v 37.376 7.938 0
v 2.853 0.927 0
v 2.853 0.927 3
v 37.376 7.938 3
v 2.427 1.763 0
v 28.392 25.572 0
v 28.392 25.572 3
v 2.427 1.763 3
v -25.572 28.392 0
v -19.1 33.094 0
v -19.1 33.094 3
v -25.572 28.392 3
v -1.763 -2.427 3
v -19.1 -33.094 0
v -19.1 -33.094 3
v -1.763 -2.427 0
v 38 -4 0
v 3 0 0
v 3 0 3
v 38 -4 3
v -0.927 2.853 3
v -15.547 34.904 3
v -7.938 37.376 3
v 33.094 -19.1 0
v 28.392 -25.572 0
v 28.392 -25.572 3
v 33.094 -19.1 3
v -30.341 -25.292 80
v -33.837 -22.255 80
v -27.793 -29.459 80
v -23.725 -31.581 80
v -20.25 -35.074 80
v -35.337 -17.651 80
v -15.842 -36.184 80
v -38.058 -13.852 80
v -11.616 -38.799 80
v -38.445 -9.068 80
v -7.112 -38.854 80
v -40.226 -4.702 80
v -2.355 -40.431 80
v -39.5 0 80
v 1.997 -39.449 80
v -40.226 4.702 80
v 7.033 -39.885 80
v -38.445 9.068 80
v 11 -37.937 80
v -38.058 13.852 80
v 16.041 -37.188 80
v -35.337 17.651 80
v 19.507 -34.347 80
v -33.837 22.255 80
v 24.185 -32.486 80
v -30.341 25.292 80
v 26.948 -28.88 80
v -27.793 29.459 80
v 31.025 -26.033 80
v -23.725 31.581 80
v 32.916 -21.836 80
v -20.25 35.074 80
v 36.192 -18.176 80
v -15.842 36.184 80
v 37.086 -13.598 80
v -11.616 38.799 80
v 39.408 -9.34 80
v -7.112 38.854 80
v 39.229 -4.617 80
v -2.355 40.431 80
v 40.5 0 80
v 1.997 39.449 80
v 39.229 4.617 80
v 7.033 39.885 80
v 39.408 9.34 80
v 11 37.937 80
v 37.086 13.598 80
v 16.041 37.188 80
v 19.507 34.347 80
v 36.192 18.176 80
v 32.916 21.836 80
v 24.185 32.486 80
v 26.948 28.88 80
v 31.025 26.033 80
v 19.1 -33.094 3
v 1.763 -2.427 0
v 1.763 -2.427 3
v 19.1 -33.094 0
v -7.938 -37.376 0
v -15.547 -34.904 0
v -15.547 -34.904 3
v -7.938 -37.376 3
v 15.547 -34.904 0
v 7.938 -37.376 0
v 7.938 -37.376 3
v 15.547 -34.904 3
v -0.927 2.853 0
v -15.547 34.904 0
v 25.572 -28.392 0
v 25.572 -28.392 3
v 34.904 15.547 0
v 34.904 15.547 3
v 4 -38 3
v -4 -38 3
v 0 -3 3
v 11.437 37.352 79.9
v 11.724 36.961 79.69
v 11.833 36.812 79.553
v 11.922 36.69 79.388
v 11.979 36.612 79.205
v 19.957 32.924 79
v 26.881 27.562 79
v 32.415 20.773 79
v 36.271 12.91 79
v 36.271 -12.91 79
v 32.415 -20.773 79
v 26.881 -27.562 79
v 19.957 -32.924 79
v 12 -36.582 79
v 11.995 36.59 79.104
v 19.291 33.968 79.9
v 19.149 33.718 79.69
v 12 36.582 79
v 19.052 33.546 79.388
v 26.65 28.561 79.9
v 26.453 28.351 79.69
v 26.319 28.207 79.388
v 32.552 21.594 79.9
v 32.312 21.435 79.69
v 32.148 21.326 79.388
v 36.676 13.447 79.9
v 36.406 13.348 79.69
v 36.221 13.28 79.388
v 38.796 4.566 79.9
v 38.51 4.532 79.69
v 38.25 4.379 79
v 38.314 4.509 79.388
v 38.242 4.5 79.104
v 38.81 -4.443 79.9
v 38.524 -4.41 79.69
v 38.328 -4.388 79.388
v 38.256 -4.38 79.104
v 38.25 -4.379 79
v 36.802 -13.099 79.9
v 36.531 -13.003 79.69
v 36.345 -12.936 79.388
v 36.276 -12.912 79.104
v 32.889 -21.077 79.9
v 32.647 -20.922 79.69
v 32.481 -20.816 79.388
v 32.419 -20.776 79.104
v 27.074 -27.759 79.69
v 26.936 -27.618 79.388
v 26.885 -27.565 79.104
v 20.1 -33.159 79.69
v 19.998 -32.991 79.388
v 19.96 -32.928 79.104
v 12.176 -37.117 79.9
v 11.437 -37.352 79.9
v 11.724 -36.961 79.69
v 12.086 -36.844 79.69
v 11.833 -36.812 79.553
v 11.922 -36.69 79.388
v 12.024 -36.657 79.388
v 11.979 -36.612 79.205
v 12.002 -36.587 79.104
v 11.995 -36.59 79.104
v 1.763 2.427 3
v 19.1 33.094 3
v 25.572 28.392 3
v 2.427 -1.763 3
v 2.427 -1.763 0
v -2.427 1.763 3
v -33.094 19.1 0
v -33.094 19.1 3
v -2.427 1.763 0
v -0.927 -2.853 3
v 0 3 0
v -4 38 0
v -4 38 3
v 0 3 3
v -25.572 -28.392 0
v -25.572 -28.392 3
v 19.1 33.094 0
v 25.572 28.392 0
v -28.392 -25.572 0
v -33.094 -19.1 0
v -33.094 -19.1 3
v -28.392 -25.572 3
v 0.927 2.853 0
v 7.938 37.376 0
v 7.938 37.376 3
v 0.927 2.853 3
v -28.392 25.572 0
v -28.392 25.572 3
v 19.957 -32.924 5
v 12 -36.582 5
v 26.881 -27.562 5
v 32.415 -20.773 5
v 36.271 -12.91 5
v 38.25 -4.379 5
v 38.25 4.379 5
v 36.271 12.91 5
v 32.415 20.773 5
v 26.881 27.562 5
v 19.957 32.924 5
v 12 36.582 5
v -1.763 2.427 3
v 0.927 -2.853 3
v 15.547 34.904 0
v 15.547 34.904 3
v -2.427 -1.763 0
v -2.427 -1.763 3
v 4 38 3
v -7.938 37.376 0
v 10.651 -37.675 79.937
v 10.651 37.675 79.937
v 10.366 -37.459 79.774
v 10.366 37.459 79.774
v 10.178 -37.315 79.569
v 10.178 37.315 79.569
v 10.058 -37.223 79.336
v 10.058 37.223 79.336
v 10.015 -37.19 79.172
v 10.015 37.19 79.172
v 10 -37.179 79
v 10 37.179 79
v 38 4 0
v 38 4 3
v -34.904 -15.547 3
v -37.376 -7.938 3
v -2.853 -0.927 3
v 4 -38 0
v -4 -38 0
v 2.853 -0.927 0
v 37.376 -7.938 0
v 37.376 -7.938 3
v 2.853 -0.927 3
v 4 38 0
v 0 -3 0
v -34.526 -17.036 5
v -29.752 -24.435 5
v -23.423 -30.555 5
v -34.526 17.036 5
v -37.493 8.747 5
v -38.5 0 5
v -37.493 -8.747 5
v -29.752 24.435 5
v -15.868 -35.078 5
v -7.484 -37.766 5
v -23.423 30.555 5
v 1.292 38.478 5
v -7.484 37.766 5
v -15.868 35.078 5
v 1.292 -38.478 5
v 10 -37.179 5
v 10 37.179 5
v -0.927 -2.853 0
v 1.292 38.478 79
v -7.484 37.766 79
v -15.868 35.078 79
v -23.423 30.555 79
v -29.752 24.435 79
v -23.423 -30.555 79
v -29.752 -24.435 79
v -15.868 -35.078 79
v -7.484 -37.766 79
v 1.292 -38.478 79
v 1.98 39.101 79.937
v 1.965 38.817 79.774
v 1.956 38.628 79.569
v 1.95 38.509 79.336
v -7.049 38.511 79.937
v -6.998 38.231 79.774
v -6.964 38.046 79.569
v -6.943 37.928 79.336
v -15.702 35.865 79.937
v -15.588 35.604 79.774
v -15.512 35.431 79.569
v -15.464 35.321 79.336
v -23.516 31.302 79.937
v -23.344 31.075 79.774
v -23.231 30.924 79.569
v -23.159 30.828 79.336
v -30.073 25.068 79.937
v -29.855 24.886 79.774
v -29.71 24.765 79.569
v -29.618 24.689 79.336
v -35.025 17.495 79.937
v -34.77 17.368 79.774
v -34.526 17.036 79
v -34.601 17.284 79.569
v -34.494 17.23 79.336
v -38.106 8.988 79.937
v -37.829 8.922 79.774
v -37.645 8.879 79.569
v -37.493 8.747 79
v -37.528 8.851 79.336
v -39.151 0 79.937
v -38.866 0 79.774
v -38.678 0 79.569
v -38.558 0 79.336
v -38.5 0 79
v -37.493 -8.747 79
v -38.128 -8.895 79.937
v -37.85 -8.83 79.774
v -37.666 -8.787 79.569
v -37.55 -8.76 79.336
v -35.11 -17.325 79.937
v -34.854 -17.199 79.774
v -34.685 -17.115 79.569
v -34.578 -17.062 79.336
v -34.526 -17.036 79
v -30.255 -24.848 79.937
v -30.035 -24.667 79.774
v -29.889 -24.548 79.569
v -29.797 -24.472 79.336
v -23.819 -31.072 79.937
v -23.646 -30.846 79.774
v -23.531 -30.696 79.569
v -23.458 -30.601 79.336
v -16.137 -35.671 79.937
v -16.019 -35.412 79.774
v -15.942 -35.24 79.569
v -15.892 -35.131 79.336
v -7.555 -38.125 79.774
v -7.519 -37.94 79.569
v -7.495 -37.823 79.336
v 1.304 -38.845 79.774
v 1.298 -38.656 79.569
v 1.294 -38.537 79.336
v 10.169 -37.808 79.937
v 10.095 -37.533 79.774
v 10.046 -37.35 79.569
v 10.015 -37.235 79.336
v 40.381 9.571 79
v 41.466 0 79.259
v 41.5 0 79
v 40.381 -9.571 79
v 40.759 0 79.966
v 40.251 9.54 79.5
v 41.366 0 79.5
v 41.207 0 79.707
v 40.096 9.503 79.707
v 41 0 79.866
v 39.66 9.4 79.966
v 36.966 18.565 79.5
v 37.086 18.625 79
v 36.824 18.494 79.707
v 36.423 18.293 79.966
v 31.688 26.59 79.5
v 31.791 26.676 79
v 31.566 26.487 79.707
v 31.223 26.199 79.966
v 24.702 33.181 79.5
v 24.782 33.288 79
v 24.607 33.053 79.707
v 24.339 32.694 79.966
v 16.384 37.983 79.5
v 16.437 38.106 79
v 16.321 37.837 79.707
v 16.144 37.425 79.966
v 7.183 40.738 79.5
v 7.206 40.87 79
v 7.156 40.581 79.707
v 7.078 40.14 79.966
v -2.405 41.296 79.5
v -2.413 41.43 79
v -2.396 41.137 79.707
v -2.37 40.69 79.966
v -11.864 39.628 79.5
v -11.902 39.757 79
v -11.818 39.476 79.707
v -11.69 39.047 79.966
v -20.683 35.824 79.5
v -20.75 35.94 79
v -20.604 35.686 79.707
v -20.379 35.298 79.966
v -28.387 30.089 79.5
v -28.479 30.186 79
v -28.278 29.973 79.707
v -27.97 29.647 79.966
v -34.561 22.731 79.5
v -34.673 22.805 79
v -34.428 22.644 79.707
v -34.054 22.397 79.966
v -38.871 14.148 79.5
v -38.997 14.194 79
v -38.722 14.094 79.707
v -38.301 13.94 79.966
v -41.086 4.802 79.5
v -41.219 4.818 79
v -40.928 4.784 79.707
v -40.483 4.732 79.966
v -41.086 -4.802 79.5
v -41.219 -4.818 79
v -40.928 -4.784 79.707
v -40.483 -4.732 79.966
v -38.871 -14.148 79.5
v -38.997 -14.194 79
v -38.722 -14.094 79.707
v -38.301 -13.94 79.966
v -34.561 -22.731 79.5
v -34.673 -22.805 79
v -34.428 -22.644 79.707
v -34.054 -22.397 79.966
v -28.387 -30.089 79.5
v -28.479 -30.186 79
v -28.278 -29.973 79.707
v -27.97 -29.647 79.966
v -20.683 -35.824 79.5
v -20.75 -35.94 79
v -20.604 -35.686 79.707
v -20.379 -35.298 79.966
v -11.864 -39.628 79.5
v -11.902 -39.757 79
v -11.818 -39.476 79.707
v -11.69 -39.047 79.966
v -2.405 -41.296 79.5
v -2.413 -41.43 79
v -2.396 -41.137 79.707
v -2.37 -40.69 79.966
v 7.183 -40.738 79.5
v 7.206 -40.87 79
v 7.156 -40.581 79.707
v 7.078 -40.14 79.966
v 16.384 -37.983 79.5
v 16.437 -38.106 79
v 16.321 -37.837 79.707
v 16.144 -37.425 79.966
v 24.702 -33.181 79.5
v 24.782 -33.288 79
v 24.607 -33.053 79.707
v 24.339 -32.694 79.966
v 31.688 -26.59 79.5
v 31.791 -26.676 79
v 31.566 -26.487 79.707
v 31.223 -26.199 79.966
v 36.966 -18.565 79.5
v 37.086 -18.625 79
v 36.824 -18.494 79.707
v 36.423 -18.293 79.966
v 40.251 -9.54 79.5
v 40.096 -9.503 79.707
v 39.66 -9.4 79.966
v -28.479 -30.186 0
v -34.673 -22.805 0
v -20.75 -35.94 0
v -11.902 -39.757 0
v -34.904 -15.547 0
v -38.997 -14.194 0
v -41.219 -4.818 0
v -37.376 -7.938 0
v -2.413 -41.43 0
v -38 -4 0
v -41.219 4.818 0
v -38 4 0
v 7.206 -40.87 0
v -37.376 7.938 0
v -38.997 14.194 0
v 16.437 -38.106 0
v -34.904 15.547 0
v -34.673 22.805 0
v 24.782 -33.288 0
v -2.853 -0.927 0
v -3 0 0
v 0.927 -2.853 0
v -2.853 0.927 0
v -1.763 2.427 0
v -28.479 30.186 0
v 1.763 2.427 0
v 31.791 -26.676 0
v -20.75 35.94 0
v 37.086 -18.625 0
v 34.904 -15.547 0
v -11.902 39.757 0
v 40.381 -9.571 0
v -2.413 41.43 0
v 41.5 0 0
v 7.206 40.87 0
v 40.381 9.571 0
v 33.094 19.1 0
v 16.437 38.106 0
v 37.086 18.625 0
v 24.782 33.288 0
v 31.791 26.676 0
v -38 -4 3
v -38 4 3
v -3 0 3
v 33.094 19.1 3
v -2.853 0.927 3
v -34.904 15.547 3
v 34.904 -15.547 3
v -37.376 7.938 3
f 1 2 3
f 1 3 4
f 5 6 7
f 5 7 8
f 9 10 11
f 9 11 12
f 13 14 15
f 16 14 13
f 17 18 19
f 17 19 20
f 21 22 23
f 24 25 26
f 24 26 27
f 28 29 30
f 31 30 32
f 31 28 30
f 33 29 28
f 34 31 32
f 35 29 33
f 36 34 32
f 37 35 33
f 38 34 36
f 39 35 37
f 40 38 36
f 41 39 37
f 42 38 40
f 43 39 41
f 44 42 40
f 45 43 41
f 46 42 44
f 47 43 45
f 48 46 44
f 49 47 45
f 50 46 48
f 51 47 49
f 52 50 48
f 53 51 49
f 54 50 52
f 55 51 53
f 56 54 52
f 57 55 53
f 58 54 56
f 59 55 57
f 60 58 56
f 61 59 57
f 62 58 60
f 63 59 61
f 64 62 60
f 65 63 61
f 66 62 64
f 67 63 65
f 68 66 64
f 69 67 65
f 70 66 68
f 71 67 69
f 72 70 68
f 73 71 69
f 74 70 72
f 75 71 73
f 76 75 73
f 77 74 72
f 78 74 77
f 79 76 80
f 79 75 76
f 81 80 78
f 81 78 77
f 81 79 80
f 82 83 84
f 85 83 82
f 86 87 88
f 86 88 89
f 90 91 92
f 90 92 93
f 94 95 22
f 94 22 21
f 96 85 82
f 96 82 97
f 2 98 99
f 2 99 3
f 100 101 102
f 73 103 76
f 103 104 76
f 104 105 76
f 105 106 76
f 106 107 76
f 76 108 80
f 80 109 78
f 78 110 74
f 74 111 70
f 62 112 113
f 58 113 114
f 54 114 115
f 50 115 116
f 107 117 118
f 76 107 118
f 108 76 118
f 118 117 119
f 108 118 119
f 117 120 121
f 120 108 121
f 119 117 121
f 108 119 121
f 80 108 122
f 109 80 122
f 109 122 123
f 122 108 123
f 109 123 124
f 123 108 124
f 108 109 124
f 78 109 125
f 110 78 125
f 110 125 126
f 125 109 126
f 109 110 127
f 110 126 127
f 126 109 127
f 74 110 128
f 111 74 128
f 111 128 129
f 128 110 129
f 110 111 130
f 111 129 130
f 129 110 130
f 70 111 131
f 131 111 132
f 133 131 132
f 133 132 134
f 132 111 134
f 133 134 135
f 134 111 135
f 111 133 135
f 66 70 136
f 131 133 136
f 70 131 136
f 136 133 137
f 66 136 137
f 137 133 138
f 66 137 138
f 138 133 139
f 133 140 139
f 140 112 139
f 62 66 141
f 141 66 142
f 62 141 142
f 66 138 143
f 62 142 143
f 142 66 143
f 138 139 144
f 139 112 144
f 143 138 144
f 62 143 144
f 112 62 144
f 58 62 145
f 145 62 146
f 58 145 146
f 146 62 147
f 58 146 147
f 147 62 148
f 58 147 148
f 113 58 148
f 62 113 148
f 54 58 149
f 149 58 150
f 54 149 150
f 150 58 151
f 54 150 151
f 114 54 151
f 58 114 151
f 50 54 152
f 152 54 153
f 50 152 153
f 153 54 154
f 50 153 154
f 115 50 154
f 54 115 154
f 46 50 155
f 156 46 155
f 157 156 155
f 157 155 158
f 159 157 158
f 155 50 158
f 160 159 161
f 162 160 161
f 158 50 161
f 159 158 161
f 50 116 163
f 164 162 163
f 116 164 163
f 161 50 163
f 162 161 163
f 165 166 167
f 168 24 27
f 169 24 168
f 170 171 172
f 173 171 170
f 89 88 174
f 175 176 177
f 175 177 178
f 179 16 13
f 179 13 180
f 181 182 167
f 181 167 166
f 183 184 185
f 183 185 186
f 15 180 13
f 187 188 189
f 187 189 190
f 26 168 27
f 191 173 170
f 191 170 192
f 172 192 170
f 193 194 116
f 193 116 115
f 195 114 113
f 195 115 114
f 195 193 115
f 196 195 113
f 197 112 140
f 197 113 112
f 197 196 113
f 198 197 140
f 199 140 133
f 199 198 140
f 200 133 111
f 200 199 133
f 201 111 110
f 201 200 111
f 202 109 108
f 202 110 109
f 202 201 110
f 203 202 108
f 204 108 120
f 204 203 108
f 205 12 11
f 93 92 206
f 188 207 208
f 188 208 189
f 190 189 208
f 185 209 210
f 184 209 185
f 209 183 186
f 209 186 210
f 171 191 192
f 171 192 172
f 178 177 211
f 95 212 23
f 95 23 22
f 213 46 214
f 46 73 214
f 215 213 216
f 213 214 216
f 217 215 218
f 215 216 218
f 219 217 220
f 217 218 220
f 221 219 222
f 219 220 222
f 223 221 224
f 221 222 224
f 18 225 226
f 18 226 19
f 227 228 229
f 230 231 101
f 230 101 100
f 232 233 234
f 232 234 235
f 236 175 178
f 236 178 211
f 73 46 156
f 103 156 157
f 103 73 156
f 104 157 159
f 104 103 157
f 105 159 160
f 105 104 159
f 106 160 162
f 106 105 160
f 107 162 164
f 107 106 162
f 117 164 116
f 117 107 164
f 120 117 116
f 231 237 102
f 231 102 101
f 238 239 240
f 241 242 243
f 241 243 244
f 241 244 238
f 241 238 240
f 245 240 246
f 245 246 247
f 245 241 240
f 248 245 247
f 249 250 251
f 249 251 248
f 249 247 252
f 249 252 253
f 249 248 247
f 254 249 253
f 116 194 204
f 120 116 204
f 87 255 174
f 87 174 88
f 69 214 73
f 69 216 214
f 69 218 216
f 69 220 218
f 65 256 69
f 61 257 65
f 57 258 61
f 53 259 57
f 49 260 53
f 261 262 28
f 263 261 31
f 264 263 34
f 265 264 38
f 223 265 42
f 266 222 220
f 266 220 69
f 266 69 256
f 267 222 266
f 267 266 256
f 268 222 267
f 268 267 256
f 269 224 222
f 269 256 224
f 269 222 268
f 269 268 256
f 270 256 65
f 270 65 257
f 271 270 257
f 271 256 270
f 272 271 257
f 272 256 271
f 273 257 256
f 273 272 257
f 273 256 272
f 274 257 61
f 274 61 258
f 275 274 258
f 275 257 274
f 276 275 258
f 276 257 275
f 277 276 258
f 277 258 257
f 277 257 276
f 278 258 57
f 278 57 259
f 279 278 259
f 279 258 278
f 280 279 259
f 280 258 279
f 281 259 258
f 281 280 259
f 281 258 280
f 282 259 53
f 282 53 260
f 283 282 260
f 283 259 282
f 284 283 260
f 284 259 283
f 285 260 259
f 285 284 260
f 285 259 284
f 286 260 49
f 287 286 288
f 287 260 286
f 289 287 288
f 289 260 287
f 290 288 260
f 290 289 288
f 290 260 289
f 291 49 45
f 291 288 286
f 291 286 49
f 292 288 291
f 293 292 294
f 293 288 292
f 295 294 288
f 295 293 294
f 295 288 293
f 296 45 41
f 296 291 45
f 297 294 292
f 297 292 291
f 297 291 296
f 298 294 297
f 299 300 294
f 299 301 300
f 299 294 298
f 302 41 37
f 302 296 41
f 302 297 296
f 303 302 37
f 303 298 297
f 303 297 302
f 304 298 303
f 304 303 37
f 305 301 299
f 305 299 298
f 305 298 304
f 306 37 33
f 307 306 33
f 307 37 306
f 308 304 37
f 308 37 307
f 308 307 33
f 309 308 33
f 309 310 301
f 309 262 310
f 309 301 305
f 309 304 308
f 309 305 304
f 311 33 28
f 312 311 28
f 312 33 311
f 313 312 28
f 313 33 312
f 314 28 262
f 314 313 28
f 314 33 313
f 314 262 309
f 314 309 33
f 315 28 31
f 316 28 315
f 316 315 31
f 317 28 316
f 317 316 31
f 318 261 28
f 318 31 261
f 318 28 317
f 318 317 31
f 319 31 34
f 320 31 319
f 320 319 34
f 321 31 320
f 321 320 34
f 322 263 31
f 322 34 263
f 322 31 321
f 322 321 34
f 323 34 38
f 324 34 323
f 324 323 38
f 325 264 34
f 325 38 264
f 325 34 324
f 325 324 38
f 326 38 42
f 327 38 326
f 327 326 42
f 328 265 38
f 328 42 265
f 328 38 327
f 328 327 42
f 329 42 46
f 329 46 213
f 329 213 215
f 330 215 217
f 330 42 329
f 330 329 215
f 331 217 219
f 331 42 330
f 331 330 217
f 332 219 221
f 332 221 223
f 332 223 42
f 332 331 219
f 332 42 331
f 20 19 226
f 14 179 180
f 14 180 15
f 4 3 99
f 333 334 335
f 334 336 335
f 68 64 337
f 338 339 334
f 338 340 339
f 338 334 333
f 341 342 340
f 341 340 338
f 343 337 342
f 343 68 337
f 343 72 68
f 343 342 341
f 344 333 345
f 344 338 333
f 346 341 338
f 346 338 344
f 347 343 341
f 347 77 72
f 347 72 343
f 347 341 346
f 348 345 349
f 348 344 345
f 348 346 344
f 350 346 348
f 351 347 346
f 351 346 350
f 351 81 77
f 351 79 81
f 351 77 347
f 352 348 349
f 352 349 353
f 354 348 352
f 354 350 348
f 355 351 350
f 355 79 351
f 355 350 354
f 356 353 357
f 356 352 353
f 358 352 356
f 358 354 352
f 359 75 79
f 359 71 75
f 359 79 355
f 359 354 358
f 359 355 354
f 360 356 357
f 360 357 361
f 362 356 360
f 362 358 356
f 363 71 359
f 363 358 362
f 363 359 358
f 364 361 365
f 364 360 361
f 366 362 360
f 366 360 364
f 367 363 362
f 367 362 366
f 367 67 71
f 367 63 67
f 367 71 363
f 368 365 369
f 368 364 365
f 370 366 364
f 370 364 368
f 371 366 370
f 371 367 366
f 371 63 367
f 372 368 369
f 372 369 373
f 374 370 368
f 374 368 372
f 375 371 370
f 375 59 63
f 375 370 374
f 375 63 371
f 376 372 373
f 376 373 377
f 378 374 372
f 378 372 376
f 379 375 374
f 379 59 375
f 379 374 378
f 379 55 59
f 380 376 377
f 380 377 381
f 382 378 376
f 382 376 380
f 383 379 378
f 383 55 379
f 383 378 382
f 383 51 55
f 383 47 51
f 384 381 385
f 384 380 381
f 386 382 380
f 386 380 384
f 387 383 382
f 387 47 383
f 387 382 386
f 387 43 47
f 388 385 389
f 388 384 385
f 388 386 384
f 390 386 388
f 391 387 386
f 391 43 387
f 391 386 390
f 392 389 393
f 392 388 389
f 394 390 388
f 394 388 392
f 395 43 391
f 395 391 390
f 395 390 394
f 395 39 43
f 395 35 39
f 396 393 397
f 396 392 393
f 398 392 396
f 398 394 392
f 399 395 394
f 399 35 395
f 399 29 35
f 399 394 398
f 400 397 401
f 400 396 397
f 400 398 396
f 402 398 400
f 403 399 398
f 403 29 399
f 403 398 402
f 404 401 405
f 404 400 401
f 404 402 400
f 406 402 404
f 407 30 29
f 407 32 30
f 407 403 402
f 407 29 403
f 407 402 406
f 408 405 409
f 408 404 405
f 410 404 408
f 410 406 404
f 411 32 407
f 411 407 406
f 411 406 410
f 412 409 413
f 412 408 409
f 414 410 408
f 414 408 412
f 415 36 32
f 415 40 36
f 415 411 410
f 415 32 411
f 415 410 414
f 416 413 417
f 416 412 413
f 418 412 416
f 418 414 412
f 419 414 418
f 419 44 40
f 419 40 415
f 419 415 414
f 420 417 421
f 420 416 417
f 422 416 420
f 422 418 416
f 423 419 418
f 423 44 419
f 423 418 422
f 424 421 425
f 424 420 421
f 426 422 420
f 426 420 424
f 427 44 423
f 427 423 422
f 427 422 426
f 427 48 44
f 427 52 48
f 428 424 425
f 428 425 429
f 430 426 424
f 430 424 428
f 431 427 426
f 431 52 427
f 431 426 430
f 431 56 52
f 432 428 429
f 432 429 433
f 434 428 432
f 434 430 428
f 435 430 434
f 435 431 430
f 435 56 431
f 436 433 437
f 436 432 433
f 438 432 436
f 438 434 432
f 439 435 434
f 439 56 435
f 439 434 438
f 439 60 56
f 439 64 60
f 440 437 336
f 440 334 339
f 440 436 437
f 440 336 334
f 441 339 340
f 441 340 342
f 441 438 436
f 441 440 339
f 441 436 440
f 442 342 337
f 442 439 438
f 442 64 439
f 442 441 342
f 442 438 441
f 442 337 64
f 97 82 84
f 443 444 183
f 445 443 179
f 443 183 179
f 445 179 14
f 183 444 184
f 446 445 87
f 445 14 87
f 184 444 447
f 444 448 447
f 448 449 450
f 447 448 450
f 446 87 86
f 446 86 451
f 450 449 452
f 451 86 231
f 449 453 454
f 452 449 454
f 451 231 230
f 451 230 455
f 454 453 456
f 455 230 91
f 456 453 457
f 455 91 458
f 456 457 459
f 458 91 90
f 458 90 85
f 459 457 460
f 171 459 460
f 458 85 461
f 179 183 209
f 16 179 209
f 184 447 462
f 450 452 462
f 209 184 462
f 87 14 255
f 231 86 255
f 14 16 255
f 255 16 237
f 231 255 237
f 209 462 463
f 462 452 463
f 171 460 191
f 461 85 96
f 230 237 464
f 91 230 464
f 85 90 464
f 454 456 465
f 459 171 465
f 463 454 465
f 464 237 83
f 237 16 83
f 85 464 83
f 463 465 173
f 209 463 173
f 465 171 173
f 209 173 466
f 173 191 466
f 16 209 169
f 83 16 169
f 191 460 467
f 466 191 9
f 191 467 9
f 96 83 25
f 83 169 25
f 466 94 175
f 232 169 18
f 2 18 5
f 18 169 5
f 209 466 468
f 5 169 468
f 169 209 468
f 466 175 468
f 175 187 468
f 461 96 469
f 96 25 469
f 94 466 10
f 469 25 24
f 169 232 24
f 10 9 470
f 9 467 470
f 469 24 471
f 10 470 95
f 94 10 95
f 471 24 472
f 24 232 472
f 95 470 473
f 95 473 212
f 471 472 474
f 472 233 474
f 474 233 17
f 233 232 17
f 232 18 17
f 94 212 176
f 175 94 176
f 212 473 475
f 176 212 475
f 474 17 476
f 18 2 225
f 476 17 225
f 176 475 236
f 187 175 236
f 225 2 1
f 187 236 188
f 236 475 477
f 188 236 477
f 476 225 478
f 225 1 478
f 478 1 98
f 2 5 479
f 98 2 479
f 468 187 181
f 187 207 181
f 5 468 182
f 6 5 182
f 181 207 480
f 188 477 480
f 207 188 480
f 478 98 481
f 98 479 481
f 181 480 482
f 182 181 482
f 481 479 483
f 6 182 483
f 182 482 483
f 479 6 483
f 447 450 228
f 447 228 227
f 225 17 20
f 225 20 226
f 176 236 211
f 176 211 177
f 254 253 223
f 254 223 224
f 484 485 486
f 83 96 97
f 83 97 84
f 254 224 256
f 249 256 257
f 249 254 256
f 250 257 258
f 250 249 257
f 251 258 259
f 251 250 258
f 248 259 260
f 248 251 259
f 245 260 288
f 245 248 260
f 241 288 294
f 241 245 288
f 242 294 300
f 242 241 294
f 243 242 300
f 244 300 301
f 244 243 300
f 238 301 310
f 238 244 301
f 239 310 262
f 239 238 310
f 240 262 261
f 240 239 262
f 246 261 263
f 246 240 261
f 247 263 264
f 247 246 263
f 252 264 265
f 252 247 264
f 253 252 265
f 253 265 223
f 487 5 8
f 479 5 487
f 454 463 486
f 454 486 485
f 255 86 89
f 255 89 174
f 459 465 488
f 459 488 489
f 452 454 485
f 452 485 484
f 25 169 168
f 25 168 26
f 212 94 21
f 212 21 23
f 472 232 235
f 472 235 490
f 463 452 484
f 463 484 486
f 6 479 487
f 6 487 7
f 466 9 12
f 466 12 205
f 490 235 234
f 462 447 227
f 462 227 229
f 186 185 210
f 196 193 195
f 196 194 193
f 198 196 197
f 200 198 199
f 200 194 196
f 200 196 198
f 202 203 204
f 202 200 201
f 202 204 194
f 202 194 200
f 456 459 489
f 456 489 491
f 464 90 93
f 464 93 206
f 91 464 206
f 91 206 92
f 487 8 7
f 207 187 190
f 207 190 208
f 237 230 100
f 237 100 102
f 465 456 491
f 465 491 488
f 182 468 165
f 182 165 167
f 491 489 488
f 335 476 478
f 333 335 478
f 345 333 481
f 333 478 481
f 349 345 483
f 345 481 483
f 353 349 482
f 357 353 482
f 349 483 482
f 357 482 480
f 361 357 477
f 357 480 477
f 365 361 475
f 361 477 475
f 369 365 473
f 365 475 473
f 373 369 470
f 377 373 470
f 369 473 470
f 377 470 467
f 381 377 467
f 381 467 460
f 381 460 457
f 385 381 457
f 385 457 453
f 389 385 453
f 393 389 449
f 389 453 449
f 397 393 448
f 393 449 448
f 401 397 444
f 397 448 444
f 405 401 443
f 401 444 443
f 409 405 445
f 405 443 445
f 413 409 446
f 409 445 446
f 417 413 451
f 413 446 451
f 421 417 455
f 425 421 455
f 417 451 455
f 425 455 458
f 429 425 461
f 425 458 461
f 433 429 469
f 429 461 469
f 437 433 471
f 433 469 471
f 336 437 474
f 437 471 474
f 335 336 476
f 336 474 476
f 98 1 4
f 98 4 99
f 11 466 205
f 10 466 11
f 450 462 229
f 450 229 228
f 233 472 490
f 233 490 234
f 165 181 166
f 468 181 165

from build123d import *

# Parameters (mm, degrees)
F0_R     = 38.5
F2_DEPTH = 5
F0_R_2   = 41.5
F1_W     = 2
F1_H     = 74.3572457801
F3_DEPTH = 80
F5_DEPTH = 3
F6_R     = 0.99999


# Not quite as in the source:
# - a fillet or chamfer is up to 0.001 mm smaller than in the source, because OpenCascade refuses the exact size


with BuildPart() as f2:
    # F0 (on Top) → F2 (new body)
    with BuildSketch(Plane.XY):
        Circle(F0_R)
    extrude(amount=F2_DEPTH)

    # F0 (on Top) + F1 (on Top) → F3 (join)
    with BuildSketch(Plane.XY):
        Circle(F0_R_2)
        Circle(F0_R, mode=Mode.SUBTRACT)
    with BuildSketch(Plane.XY):
        with Locations((11, 0)):
            Rectangle(F1_W, F1_H)
    extrude(amount=F3_DEPTH)

    # F4 (on Top) → F5 (cut)
    with BuildSketch(Plane.XY):
        Polygon((0, -3), (-4, -38), (4, -38), align=None)
        Polygon((15.5468718514, -34.9040796417), (0.9270509831, -2.8531695489), (7.9384197211, -37.3762155967), align=None)
        Polygon((25.5719075646, -28.3915047771), (1.7633557569, -2.4270509831), (19.0997716096, -33.0937867954), align=None)
        Polygon((33.0937867954, -19.0997716096), (2.4270509831, -1.7633557569), (28.3915047771, -25.5719075646), align=None)
        Polygon((37.3762155967, -7.9384197211), (2.8531695489, -0.9270509831), (34.9040796417, -15.5468718514), align=None)
        Polygon((38, 4), (3, 0), (38, -4), align=None)
        Polygon((34.9040796417, 15.5468718514), (2.8531695489, 0.9270509831), (37.3762155967, 7.9384197211), align=None)
        Polygon((28.3915047771, 25.5719075646), (2.4270509831, 1.7633557569), (33.0937867954, 19.0997716096), align=None)
        Polygon((19.0997716096, 33.0937867954), (1.7633557569, 2.4270509831), (25.5719075646, 28.3915047771), align=None)
        Polygon((7.9384197211, 37.3762155967), (0.9270509831, 2.8531695489), (15.5468718514, 34.9040796417), align=None)
        Polygon((-4, 38), (0, 3), (4, 38), align=None)
        Polygon((-15.5468718514, 34.9040796417), (-0.9270509831, 2.8531695489), (-7.9384197211, 37.3762155967), align=None)
        Polygon((-25.5719075646, 28.3915047771), (-1.7633557569, 2.4270509831), (-19.0997716096, 33.0937867954), align=None)
        Polygon((-33.0937867954, 19.0997716096), (-2.4270509831, 1.7633557569), (-28.3915047771, 25.5719075646), align=None)
        Polygon((-37.3762155967, 7.9384197211), (-2.8531695489, 0.9270509831), (-34.9040796417, 15.5468718514), align=None)
        Polygon((-38, -4), (-3, 0), (-38, 4), align=None)
        Polygon((-34.9040796417, -15.5468718514), (-2.8531695489, -0.9270509831), (-37.3762155967, -7.9384197211), align=None)
        Polygon((-28.3915047771, -25.5719075646), (-2.4270509831, -1.7633557569), (-33.0937867954, -19.0997716096), align=None)
        Polygon((-19.0997716096, -33.0937867954), (-1.7633557569, -2.4270509831), (-25.5719075646, -28.3915047771), align=None)
        Polygon((-7.9384197211, -37.3762155967), (-0.9270509831, -2.8531695489), (-15.5468718514, -34.9040796417), align=None)
    extrude(amount=F5_DEPTH, mode=Mode.SUBTRACT)

    # F6 (radius 1 in the source; OpenCascade refuses exactly that, so slightly less here)
    f6_edges = [f2.edges().sort_by_distance(p)[0] for p in [
        (-38.5, 0, 80),
        (-41.5, 0, 80),
        (12, 0, 80),
        (10, 0, 80),
        (38.5, 0, 80),
    ]]
    fillet(f6_edges, radius=F6_R)


solid = f2.part
